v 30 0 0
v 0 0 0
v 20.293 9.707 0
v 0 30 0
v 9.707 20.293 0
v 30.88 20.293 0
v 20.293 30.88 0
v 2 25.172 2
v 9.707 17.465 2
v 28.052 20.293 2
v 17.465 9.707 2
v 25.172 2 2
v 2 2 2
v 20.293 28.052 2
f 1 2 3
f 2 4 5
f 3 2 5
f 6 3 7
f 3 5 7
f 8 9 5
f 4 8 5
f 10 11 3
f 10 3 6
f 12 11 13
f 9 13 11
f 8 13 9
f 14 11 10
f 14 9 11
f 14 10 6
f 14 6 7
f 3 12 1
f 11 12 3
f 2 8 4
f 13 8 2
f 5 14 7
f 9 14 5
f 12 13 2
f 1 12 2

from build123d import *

# Parameters (mm, degrees)
F1_DEPTH = 2
F2_SIZE  = 1.99999


# Not quite as in the source:
# - a fillet or chamfer is up to 0.001 mm smaller than in the source, because OpenCascade refuses the exact size


with BuildPart() as f1:
    # F0 (on Top) → F1 (new body)
    with BuildSketch(Plane.XY):
        Polygon((0, 30), (0, 0), (30, 0), (20.2933432917, 9.7066567083), (30.880029875, 20.2933432917), (20.2933432917, 30.880029875), (9.7066567083, 20.2933432917), align=None)
    extrude(amount=F1_DEPTH)

    # F2 (size 2 in the source; OpenCascade refuses exactly that, so slightly less here)
    f2_edges = [f1.edges().sort_by_distance(p)[0] for p in [
        (25.586687, 15, 2),
        (15, 25.586687, 2),
        (25.146672, 4.853328, 2),
        (15, 0, 2),
        (0, 15, 2),
        (4.853328, 25.146672, 2),
        (25.586687, 25.586687, 2),
    ]]
    chamfer(f2_edges, length=F2_SIZE)


solid = f1.part
